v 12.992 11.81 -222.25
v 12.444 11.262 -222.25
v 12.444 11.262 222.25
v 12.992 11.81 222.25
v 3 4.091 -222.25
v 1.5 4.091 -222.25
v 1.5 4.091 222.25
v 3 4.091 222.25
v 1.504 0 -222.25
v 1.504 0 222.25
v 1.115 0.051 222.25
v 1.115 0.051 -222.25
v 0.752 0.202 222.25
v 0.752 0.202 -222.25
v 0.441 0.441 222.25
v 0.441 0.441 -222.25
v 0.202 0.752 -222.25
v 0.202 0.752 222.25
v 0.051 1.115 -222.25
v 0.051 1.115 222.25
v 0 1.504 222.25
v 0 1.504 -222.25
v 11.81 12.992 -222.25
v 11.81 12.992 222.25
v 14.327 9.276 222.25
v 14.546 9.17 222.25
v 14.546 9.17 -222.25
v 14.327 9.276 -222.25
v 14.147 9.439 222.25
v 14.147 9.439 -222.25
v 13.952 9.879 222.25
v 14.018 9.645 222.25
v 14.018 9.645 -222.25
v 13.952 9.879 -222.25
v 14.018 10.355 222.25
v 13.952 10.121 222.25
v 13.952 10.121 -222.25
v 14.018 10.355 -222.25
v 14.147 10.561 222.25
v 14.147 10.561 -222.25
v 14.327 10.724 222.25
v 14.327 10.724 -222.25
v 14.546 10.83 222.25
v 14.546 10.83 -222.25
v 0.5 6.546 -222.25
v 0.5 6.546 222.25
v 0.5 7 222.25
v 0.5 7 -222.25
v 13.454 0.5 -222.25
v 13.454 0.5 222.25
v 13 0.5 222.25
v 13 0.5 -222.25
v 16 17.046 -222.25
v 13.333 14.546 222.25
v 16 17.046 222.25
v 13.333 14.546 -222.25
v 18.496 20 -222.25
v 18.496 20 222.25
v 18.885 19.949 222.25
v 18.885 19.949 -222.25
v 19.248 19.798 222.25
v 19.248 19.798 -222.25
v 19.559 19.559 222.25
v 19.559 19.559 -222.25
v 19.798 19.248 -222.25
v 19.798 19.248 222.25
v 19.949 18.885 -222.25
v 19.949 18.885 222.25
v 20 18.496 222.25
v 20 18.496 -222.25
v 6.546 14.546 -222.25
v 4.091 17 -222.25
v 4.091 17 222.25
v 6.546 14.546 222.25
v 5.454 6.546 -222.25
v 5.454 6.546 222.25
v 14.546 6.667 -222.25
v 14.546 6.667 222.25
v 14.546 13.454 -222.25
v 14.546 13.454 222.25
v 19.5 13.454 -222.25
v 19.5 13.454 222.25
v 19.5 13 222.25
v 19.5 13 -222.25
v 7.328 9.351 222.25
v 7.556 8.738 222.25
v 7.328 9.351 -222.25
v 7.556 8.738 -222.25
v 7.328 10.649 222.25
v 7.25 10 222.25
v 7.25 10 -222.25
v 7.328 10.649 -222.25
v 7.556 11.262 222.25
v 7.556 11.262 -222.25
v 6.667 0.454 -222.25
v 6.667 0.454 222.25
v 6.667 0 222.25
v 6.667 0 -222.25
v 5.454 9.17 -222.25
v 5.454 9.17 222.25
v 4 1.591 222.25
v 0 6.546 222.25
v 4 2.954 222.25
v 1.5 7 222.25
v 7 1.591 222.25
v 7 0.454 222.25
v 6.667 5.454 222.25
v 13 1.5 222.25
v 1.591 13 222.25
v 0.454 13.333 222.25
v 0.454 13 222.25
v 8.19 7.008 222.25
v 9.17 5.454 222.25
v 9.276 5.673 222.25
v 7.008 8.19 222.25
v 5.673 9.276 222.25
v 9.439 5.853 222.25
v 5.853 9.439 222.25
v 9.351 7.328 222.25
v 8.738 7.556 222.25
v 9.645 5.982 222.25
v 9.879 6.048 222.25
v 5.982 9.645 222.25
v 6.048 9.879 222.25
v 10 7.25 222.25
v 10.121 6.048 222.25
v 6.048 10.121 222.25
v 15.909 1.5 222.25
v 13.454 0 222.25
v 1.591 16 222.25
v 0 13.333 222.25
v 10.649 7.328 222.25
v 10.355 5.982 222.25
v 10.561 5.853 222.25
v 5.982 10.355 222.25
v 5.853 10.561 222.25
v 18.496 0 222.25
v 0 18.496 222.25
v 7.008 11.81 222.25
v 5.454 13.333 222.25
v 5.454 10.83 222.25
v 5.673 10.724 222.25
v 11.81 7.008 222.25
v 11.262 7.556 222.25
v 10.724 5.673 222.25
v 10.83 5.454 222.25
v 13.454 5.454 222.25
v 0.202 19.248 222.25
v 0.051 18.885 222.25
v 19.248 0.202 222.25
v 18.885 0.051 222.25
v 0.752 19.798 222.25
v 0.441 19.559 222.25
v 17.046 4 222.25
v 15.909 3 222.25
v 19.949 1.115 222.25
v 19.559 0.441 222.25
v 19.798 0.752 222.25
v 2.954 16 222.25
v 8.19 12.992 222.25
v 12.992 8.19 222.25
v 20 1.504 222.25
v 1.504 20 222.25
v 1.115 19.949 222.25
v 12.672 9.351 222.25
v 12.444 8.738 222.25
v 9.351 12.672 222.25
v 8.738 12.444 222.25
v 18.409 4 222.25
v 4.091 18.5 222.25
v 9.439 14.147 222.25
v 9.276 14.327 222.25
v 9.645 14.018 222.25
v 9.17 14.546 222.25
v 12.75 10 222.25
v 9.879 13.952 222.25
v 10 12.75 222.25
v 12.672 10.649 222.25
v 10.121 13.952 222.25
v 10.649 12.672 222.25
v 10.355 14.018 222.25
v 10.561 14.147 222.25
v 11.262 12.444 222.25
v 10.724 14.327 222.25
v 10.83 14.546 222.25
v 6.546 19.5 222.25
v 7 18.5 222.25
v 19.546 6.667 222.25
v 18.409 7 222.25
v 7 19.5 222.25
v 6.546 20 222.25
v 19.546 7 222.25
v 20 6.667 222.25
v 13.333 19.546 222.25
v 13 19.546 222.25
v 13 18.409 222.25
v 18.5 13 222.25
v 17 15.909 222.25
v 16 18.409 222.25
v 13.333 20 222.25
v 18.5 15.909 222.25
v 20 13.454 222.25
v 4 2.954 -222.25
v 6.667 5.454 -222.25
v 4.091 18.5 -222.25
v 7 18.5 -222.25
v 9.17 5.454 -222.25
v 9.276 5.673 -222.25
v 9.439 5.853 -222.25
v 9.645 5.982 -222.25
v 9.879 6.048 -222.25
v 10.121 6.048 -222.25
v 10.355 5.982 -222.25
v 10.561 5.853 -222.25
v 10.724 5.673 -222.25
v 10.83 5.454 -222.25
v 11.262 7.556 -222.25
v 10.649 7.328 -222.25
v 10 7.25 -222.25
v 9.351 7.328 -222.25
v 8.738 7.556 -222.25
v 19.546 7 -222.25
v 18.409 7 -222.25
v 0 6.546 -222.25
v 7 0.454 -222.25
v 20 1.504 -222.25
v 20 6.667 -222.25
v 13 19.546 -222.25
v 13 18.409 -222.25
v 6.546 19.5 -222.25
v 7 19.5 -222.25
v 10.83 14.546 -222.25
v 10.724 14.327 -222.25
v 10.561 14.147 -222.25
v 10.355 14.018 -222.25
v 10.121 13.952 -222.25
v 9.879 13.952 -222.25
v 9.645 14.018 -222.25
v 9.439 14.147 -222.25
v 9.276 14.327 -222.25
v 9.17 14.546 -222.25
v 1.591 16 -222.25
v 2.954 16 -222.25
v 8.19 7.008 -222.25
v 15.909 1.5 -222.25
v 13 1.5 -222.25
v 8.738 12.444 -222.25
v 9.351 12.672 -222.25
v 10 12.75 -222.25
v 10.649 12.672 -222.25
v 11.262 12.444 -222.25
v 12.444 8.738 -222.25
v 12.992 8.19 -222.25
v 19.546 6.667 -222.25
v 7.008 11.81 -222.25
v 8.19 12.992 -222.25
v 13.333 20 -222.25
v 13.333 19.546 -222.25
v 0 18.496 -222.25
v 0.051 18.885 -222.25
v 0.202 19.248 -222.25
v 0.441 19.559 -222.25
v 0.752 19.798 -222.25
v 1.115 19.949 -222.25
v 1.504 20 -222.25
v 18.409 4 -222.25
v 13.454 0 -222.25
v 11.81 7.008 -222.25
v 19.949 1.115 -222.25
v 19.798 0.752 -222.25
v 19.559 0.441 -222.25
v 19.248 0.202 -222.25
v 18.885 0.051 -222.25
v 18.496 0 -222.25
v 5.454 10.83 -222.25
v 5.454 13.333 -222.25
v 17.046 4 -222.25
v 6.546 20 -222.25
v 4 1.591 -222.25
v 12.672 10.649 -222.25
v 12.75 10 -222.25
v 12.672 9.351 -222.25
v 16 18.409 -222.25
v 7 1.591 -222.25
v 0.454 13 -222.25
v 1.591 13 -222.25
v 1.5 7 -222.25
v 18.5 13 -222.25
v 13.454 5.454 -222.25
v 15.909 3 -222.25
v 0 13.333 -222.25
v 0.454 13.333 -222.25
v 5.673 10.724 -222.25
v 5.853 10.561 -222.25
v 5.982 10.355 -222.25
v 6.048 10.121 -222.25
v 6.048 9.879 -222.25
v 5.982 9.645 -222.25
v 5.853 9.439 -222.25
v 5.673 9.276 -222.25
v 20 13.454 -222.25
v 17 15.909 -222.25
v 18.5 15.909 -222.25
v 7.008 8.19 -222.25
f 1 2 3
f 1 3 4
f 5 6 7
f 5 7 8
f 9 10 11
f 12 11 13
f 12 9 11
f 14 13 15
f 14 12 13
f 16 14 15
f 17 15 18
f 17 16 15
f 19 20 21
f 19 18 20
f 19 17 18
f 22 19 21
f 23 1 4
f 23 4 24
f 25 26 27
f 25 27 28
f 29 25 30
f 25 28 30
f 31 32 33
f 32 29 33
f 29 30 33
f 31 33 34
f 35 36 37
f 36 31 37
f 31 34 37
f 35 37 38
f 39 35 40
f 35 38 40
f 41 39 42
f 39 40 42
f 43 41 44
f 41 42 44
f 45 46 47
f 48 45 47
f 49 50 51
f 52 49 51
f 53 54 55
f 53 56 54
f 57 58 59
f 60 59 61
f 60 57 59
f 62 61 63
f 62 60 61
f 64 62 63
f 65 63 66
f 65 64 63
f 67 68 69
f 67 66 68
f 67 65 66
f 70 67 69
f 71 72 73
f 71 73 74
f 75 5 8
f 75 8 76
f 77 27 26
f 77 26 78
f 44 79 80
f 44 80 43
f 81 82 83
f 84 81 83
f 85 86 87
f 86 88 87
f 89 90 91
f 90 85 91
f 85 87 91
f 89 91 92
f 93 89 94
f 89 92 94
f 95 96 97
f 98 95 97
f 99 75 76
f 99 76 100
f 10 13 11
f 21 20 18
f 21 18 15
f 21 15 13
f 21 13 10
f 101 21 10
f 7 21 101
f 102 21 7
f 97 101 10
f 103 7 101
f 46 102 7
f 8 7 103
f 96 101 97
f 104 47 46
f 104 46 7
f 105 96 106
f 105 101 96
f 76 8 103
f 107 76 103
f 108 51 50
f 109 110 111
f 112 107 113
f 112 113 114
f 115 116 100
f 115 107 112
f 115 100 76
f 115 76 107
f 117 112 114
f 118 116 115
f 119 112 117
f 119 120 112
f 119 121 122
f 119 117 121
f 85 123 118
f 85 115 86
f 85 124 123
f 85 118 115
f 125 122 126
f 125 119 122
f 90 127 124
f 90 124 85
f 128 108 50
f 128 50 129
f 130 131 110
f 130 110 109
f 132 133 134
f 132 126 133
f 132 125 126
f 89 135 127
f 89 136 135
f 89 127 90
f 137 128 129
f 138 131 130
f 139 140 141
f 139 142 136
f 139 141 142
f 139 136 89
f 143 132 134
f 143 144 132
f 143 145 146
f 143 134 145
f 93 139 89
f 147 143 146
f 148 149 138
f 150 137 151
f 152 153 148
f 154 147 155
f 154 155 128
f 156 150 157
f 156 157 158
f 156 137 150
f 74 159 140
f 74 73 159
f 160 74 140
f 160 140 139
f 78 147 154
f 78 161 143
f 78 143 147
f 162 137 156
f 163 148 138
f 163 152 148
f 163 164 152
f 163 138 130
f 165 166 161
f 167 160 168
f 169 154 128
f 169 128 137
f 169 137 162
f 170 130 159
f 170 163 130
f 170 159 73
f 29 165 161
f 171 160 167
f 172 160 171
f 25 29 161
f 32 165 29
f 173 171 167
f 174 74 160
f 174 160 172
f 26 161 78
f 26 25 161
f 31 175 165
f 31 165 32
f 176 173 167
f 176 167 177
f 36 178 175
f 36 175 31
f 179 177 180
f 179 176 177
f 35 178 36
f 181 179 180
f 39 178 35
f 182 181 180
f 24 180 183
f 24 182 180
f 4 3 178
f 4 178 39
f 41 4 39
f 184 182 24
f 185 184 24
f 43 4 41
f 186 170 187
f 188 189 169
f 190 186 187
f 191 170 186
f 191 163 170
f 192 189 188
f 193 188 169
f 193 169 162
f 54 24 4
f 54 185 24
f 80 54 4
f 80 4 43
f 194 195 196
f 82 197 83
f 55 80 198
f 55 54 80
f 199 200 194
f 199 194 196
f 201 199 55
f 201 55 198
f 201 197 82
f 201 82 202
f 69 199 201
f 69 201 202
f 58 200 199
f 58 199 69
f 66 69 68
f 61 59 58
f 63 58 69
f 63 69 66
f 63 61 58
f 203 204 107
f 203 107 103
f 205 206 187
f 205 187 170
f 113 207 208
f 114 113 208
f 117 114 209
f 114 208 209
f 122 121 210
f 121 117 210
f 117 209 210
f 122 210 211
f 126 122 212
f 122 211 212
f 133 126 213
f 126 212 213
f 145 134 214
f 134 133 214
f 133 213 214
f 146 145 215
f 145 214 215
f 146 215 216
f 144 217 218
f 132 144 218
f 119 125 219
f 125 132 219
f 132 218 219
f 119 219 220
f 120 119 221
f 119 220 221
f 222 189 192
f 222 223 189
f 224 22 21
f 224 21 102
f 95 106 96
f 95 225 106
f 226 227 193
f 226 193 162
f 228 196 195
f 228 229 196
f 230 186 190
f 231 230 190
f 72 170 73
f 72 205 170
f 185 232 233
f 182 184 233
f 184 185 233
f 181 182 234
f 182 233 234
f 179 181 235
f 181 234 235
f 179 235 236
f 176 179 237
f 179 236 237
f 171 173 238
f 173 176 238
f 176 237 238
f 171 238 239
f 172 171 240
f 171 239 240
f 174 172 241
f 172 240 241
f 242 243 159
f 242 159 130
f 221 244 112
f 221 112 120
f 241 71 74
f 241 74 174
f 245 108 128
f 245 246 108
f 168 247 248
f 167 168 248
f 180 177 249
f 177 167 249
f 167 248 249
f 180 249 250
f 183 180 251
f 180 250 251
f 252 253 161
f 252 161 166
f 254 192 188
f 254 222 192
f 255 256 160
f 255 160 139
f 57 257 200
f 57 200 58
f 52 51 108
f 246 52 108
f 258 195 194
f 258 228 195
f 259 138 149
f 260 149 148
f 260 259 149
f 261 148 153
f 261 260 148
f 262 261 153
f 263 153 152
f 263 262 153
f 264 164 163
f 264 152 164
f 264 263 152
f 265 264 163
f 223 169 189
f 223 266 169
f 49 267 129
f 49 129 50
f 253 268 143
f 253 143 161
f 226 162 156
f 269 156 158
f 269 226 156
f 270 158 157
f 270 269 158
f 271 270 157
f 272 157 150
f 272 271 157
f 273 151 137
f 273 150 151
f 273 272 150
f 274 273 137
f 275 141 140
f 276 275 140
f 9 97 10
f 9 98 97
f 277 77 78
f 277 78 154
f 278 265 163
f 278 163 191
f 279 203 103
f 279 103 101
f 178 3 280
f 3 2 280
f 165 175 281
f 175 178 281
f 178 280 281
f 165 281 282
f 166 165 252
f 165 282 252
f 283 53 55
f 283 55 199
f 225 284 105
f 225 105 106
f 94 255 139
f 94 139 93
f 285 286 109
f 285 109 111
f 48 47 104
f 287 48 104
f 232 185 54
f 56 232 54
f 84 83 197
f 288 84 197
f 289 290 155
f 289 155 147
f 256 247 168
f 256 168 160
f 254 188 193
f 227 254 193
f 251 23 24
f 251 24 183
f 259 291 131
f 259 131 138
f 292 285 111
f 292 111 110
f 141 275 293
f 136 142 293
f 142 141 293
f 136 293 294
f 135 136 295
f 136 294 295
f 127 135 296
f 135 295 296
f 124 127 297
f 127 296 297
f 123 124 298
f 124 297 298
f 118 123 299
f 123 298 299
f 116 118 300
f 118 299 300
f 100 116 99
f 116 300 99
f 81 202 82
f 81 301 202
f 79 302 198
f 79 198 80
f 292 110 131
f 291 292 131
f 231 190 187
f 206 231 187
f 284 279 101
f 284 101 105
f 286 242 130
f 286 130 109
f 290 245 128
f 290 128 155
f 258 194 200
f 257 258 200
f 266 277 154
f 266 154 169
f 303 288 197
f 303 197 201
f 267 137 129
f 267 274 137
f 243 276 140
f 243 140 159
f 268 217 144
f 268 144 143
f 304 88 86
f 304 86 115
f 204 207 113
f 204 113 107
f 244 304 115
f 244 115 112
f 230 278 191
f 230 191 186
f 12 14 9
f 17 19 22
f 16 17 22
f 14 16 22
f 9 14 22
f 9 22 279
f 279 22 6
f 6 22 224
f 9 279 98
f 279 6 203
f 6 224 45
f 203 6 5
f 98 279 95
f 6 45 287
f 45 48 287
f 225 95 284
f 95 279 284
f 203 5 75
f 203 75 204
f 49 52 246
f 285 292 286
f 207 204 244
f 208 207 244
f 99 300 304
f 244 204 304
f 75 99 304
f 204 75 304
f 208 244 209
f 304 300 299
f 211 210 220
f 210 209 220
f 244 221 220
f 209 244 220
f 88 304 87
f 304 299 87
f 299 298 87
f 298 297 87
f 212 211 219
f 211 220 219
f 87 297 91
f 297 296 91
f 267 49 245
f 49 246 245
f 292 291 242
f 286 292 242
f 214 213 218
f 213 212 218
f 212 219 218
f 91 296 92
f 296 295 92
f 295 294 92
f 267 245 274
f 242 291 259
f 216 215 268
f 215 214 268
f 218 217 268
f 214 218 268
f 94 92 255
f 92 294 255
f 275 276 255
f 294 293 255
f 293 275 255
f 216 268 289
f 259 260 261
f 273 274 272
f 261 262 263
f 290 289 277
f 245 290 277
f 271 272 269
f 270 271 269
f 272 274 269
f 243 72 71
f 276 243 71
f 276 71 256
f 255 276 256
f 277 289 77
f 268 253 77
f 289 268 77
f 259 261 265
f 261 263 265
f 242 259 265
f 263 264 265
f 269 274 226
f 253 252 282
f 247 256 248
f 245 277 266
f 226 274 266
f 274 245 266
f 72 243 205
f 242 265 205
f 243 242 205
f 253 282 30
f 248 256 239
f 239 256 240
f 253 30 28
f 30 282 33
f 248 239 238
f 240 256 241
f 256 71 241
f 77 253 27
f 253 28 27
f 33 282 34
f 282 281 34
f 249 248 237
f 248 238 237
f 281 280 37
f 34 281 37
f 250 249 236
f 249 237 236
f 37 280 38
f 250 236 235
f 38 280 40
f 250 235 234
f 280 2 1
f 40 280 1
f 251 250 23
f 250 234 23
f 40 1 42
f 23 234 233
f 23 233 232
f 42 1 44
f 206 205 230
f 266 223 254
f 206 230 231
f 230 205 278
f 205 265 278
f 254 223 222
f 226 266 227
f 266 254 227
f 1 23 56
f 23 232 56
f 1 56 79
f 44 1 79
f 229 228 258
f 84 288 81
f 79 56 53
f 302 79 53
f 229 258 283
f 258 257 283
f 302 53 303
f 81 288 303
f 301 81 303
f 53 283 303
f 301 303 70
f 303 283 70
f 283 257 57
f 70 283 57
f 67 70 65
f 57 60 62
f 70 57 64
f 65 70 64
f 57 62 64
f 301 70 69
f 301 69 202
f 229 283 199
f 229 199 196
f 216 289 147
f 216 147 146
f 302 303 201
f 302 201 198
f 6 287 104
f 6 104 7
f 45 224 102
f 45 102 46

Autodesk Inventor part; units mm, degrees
ref_plane "YZ Plane" through (0, 0, 0) normal (1, 0, 0) x (0, 1, 0)
ref_plane "XZ Plane" through (0, 0, 0) normal (0, 1, 0) x (-1, 0, 0)
ref_plane "XY Plane" through (0, 0, 0) normal (0, 0, 1) x (1, 0, 0)
sketch "Sketch1" plane through (0, 0, 0) normal (0, 0, 1) x (1, 0, 0)
  line L0 (11.2616, 7.5565) -> (11.8104, 7.0077)
  line L1 (11.8104, 7.0077) -> (12.9923, 8.1896)
  line L2 (12.9923, 8.1896) -> (12.4435, 8.7384)
  arc A0 (12.4435, 8.7384) -> (12.4435, 11.2616) centre (10, 10) ccw
  line L3 (12.4435, 11.2616) -> (12.9923, 11.8104)
  line L4 (12.9923, 11.8104) -> (11.8104, 12.9923)
  line L5 (11.8104, 12.9923) -> (11.2616, 12.4435)
  arc A1 (11.2616, 12.4435) -> (8.7384, 12.4435) centre (10, 10) ccw
  line L6 (8.7384, 12.4435) -> (8.1896, 12.9923)
  line L7 (8.1896, 12.9923) -> (7.0077, 11.8104)
  line L8 (7.0077, 11.8104) -> (7.5565, 11.2616)
  arc A2 (7.5565, 11.2616) -> (7.5565, 8.7384) centre (10, 10) ccw
  line L9 (7.5565, 8.7384) -> (7.0077, 8.1896)
  line L10 (7.0077, 8.1896) -> (8.1896, 7.0077)
  line L11 (8.1896, 7.0077) -> (8.7384, 7.5565)
  arc A3 (8.7384, 7.5565) -> (11.2616, 7.5565) centre (10, 10) ccw
  line L12 (13.4545, 0) -> (13.4545, 0.5)
  line L13 (13.4545, 0.5) -> (13, 0.5)
  line L14 (13, 0.5) -> (13, 1.5)
  line L15 (13, 1.5) -> (15.9091, 1.5)
  line L16 (15.9091, 1.5) -> (15.9091, 3)
  line L17 (15.9091, 3) -> (13.4545, 5.4545)
  line L18 (13.4545, 5.4545) -> (10.8302, 5.4545)
  arc A4 (10.8302, 5.4545) -> (9.1698, 5.4545) centre (10, 5.1837) ccw
  line L19 (9.1698, 5.4545) -> (6.6667, 5.4545)
  line L20 (6.6667, 5.4545) -> (4, 2.9545)
  line L21 (4, 2.9545) -> (4, 1.5909)
  line L22 (4, 1.5909) -> (7, 1.5909)
  line L23 (7, 1.5909) -> (7, 0.4545)
  line L24 (7, 0.4545) -> (6.6667, 0.4545)
  line L25 (6.6667, 0.4545) -> (6.6667, 0)
  line L26 (6.6667, 0) -> (1.5043, 0)
  arc A5 (0, 1.5043) -> (1.5043, 0) centre (1.5043, 1.5043) ccw
  line L27 (0, 1.5043) -> (0, 6.5455)
  line L28 (0, 6.5455) -> (0.5, 6.5455)
  line L29 (0.5, 6.5455) -> (0.5, 7)
  line L30 (0.5, 7) -> (1.5, 7)
  line L31 (1.5, 7) -> (1.5, 4.0909)
  line L32 (1.5, 4.0909) -> (3, 4.0909)
  line L33 (3, 4.0909) -> (5.4545, 6.5455)
  line L34 (5.4545, 6.5455) -> (5.4545, 9.1698)
  arc A6 (5.4545, 9.1698) -> (5.4545, 10.8302) centre (5.1837, 10) ccw
  line L35 (5.4545, 10.8302) -> (5.4545, 13.3333)
  line L36 (5.4545, 13.3333) -> (2.9545, 16)
  line L37 (2.9545, 16) -> (1.5909, 16)
  line L38 (1.5909, 16) -> (1.5909, 13)
  line L39 (1.5909, 13) -> (0.4545, 13)
  line L40 (0.4545, 13) -> (0.4545, 13.3333)
  line L41 (0.4545, 13.3333) -> (0, 13.3333)
  line L42 (0, 13.3333) -> (0, 18.4957)
  arc A7 (1.5043, 20) -> (0, 18.4957) centre (1.5043, 18.4957) ccw
  line L43 (1.5043, 20) -> (6.5455, 20)
  line L44 (6.5455, 20) -> (6.5455, 19.5)
  line L45 (6.5455, 19.5) -> (7, 19.5)
  line L46 (7, 19.5) -> (7, 18.5)
  line L47 (7, 18.5) -> (4.0909, 18.5)
  line L48 (4.0909, 18.5) -> (4.0909, 17)
  line L49 (4.0909, 17) -> (6.5455, 14.5455)
  line L50 (6.5455, 14.5455) -> (9.1698, 14.5455)
  arc A8 (9.1698, 14.5455) -> (10.8302, 14.5455) centre (10, 14.8163) ccw
  line L51 (10.8302, 14.5455) -> (13.3333, 14.5455)
  line L52 (13.3333, 14.5455) -> (16, 17.0455)
  line L53 (16, 17.0455) -> (16, 18.4091)
  line L54 (16, 18.4091) -> (13, 18.4091)
  line L55 (13, 18.4091) -> (13, 19.5455)
  line L56 (13, 19.5455) -> (13.3333, 19.5455)
  line L57 (13.3333, 19.5455) -> (13.3333, 20)
  line L58 (13.3333, 20) -> (18.4957, 20)
  arc A9 (20, 18.4957) -> (18.4957, 20) centre (18.4957, 18.4957) ccw
  line L59 (20, 18.4957) -> (20, 13.4545)
  line L60 (20, 13.4545) -> (19.5, 13.4545)
  line L61 (19.5, 13.4545) -> (19.5, 13)
  line L62 (19.5, 13) -> (18.5, 13)
  line L63 (18.5, 13) -> (18.5, 15.9091)
  line L64 (18.5, 15.9091) -> (17, 15.9091)
  line L65 (17, 15.9091) -> (14.5455, 13.4545)
  line L66 (14.5455, 13.4545) -> (14.5455, 10.8302)
  arc A10 (14.5455, 10.8302) -> (14.5455, 9.1698) centre (14.8163, 10) ccw
  line L67 (14.5455, 9.1698) -> (14.5455, 6.6667)
  line L68 (14.5455, 6.6667) -> (17.0455, 4)
  line L69 (17.0455, 4) -> (18.4091, 4)
  line L70 (18.4091, 4) -> (18.4091, 7)
  line L71 (18.4091, 7) -> (19.5455, 7)
  line L72 (19.5455, 7) -> (19.5455, 6.6667)
  line L73 (19.5455, 6.6667) -> (20, 6.6667)
  line L74 (20, 6.6667) -> (20, 1.5043)
  arc A11 (18.4957, 0) -> (20, 1.5043) centre (18.4957, 1.5043) ccw
  line L75 (18.4957, 0) -> (13.4545, 0)
  point P0 (0, 0)
  point P1 (0.4406, 0.4406)
  point P2 (10, 0)
  point P3 (10, 0)
  point P4 (10, 0)
  point P5 (19.5594, 0.4406)
  point P6 (0, 10)
  point P7 (0, 10)
  point P8 (0, 10)
  point P9 (10, 10)
  point P10 (20, 10)
  point P11 (20, 10)
  point P12 (20, 10)
  point P13 (0.4406, 19.5594)
  point P14 (10, 20)
  point P15 (10, 20)
  point P16 (10, 20)
  point P17 (19.5594, 19.5594)
extrude "Extrusion1" add sketch "Sketch1" along normal mid plane 444.5
properties part number "Long side"
